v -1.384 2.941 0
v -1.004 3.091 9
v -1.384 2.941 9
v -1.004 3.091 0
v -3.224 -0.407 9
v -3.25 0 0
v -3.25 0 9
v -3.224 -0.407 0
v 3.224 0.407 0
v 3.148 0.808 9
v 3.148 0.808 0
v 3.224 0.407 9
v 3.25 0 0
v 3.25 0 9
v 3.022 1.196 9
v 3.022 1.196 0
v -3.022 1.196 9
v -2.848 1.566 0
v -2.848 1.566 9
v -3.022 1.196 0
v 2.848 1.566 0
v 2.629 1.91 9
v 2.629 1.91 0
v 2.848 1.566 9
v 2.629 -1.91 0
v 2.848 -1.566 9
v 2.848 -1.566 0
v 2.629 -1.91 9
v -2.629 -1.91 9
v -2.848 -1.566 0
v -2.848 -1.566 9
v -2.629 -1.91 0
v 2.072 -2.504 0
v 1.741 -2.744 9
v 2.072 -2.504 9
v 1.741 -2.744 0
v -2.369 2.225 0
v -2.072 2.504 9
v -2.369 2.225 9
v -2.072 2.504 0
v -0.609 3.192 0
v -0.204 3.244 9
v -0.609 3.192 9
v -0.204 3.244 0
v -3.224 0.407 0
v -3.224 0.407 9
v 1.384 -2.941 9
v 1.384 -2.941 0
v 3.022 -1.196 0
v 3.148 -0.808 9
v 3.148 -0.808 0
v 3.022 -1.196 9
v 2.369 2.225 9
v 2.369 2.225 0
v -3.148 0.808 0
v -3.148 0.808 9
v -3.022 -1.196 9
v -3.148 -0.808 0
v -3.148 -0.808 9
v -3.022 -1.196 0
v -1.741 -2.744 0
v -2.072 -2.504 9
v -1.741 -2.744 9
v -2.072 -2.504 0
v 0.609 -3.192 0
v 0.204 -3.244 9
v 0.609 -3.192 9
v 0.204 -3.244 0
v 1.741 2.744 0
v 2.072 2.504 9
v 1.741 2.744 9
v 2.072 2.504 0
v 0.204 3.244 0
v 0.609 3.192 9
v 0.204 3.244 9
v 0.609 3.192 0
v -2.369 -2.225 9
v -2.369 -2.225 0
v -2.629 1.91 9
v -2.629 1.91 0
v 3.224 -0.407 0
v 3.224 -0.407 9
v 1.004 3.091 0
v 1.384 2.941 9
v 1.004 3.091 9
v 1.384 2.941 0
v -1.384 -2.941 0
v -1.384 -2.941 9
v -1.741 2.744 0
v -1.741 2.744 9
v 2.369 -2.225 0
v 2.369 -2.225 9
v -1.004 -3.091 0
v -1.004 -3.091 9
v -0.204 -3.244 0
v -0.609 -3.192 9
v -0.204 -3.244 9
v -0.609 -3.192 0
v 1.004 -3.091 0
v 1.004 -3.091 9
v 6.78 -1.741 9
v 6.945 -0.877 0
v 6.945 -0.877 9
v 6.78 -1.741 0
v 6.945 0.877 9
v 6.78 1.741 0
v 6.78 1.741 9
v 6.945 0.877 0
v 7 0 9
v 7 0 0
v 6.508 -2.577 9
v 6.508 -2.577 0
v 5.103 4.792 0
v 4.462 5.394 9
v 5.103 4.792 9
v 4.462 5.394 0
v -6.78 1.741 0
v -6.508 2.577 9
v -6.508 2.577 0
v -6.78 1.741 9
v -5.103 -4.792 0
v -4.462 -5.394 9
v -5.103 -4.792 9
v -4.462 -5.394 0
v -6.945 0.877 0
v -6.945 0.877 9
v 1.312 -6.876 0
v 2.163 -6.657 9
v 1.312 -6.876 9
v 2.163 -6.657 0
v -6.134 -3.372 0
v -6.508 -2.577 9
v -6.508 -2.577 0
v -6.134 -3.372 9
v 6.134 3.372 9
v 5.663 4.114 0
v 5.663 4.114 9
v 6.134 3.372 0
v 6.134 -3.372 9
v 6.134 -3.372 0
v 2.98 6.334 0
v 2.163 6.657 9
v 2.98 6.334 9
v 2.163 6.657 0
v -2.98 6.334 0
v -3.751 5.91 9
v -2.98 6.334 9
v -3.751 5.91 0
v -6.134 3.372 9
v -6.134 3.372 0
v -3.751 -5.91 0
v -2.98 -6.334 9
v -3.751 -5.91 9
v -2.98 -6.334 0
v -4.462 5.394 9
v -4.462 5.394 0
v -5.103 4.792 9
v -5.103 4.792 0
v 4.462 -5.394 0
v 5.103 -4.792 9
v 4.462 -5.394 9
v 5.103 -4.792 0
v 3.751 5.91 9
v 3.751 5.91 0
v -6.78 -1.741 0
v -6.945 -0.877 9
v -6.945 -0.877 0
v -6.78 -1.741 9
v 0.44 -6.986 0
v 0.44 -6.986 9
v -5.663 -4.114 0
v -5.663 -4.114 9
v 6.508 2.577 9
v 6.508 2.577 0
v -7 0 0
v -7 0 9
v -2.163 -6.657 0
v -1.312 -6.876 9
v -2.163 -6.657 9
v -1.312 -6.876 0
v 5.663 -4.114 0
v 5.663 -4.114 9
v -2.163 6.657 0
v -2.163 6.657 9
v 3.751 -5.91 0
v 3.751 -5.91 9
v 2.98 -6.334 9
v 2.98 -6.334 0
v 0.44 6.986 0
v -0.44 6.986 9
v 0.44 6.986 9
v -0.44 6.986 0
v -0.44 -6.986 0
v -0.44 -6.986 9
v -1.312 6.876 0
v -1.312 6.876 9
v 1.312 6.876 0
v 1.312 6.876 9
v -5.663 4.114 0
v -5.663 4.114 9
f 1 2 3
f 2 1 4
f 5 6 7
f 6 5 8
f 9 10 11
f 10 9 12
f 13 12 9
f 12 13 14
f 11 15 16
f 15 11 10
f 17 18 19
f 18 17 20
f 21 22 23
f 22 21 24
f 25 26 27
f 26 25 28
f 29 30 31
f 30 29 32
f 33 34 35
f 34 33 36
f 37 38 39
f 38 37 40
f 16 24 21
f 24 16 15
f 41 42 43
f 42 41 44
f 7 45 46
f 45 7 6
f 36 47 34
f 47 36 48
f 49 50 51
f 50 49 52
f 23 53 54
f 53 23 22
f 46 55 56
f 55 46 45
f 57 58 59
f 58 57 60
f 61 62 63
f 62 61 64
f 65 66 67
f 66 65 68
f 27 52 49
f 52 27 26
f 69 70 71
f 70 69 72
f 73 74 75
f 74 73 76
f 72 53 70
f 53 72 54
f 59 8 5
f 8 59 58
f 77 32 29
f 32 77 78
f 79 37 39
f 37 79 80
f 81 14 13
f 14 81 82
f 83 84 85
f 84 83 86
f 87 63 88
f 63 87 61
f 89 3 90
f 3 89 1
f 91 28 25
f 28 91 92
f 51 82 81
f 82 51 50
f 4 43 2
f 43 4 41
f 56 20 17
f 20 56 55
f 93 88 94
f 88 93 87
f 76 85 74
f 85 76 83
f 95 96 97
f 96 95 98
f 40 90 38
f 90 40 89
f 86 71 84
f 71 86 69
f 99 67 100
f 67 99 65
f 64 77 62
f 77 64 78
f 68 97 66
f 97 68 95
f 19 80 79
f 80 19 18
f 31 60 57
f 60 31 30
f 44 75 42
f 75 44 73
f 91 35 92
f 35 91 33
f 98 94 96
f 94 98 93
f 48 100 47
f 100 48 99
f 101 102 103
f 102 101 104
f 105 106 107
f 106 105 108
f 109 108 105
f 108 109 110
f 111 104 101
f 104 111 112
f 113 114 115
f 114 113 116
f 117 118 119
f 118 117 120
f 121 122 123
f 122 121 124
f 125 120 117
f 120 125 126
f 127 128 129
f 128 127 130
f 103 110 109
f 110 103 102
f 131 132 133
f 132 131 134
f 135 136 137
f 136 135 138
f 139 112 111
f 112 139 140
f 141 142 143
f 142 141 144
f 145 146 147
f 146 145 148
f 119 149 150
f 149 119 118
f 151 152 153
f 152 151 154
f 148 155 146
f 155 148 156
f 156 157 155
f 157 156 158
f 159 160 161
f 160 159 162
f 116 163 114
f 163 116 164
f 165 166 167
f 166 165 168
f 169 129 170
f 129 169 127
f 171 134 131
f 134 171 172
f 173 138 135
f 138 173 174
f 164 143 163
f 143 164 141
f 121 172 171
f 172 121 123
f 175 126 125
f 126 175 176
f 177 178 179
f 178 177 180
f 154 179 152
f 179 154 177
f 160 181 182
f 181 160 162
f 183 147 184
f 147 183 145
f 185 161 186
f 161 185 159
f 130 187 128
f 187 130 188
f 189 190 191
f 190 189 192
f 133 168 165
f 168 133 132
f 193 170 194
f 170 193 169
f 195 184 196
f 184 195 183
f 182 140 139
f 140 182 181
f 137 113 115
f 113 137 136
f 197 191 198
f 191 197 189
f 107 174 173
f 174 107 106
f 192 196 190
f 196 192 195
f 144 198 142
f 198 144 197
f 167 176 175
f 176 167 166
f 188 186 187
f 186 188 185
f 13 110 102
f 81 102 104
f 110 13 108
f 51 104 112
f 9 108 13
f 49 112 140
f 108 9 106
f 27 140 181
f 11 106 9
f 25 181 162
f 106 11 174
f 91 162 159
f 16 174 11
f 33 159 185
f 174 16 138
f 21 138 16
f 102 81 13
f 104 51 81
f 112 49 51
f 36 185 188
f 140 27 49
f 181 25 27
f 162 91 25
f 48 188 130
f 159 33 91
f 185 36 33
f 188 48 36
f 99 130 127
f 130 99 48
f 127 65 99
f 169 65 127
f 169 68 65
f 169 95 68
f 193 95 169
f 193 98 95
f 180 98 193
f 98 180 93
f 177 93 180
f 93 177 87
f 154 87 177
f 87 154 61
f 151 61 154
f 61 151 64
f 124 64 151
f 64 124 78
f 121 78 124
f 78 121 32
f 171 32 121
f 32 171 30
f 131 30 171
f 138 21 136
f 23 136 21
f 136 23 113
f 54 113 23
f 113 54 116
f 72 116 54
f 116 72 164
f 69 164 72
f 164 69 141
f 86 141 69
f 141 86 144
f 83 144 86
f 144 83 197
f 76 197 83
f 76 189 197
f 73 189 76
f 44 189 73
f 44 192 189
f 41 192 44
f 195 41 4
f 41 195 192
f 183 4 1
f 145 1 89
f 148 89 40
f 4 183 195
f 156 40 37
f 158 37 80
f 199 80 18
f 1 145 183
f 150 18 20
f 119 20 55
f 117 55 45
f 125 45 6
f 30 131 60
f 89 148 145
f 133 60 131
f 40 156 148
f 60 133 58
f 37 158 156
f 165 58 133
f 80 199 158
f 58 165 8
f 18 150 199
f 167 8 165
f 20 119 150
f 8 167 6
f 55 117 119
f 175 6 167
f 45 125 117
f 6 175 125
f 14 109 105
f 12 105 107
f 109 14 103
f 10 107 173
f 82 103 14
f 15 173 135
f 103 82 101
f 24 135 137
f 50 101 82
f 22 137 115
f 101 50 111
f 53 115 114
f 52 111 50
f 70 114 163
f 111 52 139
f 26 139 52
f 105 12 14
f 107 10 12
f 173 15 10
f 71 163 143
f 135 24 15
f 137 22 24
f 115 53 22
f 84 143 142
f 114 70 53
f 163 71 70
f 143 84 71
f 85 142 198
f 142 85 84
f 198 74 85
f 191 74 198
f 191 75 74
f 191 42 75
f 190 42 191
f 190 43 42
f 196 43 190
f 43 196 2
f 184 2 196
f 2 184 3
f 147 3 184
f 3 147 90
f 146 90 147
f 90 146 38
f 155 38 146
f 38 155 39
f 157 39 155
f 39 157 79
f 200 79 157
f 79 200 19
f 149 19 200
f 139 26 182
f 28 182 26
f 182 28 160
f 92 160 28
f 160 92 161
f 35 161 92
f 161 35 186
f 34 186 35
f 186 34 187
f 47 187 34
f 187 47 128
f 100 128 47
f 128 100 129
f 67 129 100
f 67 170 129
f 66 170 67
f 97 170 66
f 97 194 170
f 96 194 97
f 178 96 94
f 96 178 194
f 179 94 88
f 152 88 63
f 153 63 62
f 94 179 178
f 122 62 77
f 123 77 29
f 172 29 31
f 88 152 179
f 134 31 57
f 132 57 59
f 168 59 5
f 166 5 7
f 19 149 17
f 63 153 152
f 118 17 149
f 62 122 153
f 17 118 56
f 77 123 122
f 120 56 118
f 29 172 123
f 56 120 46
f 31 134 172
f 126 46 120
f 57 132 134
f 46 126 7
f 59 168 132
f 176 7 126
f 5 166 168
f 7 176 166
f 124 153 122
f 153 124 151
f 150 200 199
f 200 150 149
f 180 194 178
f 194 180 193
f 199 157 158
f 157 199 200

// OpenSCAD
$fn = 50;


difference() {
	union() {
		cylinder(h = 9, r = 7.0000000000);
	}
	union() {
		#translate(v = [0.0000000000, 0.0000000000, -100.0000000000]) {
			cylinder(h = 200, r = 3.2500000000);
		}
		#translate(v = [0.0000000000, 0.0000000000, -100.0000000000]) {
			cylinder(h = 200, r = 3.2500000000);
		}
		#translate(v = [0.0000000000, 0.0000000000, -100.0000000000]) {
			cylinder(h = 200, r = 3.2500000000);
		}
		#translate(v = [0.0000000000, 0.0000000000, -100.0000000000]) {
			cylinder(h = 200, r = 3.2500000000);
		}
		#cylinder(h = 9, r = 2.0000000000);
	}
}
